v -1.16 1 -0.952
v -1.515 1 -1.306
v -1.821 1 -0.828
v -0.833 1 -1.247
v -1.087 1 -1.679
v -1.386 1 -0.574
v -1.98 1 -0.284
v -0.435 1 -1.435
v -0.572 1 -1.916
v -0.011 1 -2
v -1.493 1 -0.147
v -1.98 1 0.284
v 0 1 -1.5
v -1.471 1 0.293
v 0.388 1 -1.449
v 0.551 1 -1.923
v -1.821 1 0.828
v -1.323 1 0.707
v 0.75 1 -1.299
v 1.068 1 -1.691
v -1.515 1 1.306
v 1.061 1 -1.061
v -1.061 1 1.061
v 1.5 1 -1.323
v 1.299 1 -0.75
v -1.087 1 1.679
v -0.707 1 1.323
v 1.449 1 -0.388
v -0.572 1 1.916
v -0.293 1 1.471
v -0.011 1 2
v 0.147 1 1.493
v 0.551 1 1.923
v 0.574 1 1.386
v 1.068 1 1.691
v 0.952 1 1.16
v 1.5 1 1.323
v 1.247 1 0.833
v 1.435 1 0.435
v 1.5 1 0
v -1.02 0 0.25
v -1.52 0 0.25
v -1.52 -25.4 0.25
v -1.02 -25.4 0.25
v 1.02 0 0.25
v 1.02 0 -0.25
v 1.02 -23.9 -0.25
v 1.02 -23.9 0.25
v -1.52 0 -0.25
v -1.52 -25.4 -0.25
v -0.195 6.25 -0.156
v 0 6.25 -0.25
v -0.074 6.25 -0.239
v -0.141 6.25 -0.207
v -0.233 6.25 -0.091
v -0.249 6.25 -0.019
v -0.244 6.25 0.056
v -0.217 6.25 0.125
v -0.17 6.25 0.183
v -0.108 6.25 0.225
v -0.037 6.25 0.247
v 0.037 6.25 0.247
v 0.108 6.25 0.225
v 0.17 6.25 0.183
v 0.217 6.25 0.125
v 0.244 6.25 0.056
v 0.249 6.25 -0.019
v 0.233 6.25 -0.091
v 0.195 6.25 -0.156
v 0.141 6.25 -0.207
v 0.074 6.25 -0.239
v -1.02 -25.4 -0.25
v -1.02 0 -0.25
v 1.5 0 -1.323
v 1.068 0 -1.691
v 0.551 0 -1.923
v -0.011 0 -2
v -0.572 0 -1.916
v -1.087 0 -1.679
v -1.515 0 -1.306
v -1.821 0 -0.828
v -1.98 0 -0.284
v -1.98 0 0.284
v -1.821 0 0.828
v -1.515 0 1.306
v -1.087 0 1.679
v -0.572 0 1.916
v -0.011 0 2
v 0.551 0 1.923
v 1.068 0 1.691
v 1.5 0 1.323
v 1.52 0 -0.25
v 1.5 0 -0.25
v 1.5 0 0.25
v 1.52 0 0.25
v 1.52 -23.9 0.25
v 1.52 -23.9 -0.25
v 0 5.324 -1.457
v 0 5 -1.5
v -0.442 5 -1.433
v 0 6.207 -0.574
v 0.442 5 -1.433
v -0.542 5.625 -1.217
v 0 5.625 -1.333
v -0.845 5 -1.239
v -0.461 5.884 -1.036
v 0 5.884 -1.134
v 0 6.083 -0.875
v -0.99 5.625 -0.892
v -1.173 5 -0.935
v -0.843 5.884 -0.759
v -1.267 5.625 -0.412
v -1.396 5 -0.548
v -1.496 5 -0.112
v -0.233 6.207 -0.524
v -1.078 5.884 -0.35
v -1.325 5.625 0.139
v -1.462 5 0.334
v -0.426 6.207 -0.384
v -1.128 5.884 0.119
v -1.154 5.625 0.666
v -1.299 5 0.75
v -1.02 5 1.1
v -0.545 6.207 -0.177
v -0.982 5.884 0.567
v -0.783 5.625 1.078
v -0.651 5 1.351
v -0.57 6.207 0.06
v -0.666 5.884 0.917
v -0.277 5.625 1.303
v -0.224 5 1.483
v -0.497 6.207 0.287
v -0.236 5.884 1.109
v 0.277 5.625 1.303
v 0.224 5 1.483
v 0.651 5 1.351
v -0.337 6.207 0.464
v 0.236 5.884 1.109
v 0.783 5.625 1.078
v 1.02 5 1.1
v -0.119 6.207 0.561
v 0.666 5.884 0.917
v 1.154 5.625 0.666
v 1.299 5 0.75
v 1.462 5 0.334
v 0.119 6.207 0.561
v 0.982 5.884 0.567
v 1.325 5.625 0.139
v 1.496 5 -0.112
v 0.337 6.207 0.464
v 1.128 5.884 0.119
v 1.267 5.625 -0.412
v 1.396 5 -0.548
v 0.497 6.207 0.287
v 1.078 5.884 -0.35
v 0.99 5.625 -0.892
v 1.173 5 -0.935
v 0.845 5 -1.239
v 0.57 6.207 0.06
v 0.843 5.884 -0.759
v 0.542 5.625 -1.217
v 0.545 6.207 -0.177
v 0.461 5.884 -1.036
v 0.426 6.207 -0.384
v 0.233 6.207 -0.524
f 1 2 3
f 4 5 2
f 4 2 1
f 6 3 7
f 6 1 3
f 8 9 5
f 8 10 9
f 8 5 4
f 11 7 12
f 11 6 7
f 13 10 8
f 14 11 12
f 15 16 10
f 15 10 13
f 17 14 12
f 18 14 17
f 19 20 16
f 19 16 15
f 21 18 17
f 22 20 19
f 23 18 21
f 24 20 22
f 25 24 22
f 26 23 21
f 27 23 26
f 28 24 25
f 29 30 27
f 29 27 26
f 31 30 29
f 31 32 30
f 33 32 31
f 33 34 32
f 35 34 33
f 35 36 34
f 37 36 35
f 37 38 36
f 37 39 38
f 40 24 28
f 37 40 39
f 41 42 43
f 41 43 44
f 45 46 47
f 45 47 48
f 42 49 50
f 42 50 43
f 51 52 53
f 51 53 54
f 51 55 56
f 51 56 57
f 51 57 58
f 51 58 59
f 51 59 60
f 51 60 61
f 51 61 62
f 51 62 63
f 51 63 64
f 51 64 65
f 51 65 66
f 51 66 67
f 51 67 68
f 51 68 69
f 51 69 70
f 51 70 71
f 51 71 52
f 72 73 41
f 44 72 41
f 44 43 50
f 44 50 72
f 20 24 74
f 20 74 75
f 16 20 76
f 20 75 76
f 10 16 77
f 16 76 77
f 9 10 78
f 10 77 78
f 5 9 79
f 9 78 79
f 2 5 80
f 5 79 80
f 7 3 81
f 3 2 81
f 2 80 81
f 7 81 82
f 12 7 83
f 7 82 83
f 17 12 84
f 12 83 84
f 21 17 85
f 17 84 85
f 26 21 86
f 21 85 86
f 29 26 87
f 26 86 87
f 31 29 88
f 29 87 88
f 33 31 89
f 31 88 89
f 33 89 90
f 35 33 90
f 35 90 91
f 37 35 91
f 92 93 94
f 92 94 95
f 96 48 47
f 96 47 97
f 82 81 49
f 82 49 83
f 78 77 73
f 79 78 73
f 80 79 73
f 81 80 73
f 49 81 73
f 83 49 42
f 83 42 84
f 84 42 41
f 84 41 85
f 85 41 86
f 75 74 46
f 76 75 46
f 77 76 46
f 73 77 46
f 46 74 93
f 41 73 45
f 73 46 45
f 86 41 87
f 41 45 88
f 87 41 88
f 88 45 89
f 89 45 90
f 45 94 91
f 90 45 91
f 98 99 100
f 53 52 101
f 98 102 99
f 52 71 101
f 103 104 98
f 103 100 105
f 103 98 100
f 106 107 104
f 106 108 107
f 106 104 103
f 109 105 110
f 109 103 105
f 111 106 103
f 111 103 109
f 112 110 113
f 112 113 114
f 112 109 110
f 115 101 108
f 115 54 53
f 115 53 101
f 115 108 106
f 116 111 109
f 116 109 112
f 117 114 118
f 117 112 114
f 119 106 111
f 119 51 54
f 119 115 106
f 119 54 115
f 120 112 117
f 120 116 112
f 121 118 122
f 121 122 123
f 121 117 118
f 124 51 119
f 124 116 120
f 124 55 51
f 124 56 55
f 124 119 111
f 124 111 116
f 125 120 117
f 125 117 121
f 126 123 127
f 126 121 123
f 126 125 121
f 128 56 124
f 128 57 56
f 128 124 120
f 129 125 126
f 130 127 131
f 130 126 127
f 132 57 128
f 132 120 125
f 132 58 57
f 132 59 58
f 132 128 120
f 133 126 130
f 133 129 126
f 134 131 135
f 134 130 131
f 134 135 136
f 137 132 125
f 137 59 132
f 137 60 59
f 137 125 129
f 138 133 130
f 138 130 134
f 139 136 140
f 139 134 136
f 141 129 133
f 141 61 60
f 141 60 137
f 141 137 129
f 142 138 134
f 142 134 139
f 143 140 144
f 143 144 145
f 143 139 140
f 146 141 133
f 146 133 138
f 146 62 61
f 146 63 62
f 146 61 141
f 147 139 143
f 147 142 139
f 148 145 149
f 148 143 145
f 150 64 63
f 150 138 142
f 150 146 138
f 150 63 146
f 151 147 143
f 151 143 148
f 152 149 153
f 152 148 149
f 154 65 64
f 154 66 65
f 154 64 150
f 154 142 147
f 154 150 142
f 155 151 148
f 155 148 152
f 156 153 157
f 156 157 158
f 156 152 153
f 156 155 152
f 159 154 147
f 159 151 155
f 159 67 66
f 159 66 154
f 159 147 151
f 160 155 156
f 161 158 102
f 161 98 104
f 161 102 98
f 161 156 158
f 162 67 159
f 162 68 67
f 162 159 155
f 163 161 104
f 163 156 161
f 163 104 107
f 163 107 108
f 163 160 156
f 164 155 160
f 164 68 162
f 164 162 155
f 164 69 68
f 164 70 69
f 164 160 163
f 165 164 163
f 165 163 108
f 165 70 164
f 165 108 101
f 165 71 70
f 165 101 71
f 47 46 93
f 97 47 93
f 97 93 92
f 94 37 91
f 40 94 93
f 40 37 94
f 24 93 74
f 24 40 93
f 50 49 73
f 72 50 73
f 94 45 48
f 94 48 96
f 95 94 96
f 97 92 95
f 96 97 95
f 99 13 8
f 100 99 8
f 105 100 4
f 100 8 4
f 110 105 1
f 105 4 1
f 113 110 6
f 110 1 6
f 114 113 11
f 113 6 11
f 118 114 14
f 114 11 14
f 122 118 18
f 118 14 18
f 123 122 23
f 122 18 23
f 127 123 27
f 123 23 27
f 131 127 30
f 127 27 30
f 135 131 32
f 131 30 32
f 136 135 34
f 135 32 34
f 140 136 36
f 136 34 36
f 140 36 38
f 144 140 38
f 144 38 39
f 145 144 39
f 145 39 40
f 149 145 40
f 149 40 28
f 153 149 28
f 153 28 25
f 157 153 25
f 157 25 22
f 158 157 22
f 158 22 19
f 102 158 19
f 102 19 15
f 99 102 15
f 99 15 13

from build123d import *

# Parameters (mm, degrees)
CROQUIS1_R           = 2
BASE_DEPTH           = 1
CROQUIS2_R           = 1.5
CUERPO_DEL_LED_DEPTH = 5.25
CROQUIS3_W           = 0.5
CROQUIS3_H           = 0.5
PINES_DEPTH          = 25.4
CROQUIS4_W           = 0.5
CROQUIS4_H           = 0.5
CORTE_A_CATODO_DEPTH = 1.5
CROQUIS6_W           = 1
CROQUIS6_H           = 4.5
RANURA_DEPTH         = 1
PUNTA_DEL_LED_R      = 1.25


with BuildPart() as part:
    # Croquis1 → Base (new body)
    with BuildSketch(Plane(origin=(0, 0, 0), x_dir=(1, 0, 0), z_dir=(0, 1, 0))):
        with Locations(Location((0, 0, 0), (0, 0, 270))):
            Circle(CROQUIS1_R)
    extrude(amount=BASE_DEPTH)

    # Croquis2 → Cuerpo del LED (add)
    with BuildSketch(Plane(origin=(0, 1, 0), x_dir=(1, 0, 0), z_dir=(0, 1, 0))):
        with Locations(Location((0, 0, 0), (0, 0, 90))):
            Circle(CROQUIS2_R)
    extrude(amount=CUERPO_DEL_LED_DEPTH)

    # Croquis3 → Pines (add)
    with BuildSketch(Plane.XZ):
        with Locations((-1.270142923, 0)):
            Rectangle(CROQUIS3_W, CROQUIS3_H)
        with Locations((1.270172723, 0)):
            Rectangle(CROQUIS3_W, CROQUIS3_H)
    extrude(amount=PINES_DEPTH)

    # Croquis4 → Corte a Catodo (cut)
    with BuildSketch(Plane.XZ.offset(25.4)):
        with Locations((1.270172723, 0)):
            Rectangle(CROQUIS4_W, CROQUIS4_H)
    extrude(amount=-CORTE_A_CATODO_DEPTH, mode=Mode.SUBTRACT)

    # Croquis6 → Ranura (cut)
    with BuildSketch(Plane(origin=(0, 1, 0), x_dir=(1, 0, 0), z_dir=(0, 1, 0))):
        with Locations((2, 0.48044739)):
            Rectangle(CROQUIS6_W, CROQUIS6_H)
    extrude(amount=-RANURA_DEPTH, mode=Mode.SUBTRACT)

    # Punta del Led
    punta_del_led_edges = [part.edges().sort_by_distance(p)[0] for p in [
        (0, 6.25, 1.5),
    ]]
    fillet(punta_del_led_edges, radius=PUNTA_DEL_LED_R)


solid = part.part
